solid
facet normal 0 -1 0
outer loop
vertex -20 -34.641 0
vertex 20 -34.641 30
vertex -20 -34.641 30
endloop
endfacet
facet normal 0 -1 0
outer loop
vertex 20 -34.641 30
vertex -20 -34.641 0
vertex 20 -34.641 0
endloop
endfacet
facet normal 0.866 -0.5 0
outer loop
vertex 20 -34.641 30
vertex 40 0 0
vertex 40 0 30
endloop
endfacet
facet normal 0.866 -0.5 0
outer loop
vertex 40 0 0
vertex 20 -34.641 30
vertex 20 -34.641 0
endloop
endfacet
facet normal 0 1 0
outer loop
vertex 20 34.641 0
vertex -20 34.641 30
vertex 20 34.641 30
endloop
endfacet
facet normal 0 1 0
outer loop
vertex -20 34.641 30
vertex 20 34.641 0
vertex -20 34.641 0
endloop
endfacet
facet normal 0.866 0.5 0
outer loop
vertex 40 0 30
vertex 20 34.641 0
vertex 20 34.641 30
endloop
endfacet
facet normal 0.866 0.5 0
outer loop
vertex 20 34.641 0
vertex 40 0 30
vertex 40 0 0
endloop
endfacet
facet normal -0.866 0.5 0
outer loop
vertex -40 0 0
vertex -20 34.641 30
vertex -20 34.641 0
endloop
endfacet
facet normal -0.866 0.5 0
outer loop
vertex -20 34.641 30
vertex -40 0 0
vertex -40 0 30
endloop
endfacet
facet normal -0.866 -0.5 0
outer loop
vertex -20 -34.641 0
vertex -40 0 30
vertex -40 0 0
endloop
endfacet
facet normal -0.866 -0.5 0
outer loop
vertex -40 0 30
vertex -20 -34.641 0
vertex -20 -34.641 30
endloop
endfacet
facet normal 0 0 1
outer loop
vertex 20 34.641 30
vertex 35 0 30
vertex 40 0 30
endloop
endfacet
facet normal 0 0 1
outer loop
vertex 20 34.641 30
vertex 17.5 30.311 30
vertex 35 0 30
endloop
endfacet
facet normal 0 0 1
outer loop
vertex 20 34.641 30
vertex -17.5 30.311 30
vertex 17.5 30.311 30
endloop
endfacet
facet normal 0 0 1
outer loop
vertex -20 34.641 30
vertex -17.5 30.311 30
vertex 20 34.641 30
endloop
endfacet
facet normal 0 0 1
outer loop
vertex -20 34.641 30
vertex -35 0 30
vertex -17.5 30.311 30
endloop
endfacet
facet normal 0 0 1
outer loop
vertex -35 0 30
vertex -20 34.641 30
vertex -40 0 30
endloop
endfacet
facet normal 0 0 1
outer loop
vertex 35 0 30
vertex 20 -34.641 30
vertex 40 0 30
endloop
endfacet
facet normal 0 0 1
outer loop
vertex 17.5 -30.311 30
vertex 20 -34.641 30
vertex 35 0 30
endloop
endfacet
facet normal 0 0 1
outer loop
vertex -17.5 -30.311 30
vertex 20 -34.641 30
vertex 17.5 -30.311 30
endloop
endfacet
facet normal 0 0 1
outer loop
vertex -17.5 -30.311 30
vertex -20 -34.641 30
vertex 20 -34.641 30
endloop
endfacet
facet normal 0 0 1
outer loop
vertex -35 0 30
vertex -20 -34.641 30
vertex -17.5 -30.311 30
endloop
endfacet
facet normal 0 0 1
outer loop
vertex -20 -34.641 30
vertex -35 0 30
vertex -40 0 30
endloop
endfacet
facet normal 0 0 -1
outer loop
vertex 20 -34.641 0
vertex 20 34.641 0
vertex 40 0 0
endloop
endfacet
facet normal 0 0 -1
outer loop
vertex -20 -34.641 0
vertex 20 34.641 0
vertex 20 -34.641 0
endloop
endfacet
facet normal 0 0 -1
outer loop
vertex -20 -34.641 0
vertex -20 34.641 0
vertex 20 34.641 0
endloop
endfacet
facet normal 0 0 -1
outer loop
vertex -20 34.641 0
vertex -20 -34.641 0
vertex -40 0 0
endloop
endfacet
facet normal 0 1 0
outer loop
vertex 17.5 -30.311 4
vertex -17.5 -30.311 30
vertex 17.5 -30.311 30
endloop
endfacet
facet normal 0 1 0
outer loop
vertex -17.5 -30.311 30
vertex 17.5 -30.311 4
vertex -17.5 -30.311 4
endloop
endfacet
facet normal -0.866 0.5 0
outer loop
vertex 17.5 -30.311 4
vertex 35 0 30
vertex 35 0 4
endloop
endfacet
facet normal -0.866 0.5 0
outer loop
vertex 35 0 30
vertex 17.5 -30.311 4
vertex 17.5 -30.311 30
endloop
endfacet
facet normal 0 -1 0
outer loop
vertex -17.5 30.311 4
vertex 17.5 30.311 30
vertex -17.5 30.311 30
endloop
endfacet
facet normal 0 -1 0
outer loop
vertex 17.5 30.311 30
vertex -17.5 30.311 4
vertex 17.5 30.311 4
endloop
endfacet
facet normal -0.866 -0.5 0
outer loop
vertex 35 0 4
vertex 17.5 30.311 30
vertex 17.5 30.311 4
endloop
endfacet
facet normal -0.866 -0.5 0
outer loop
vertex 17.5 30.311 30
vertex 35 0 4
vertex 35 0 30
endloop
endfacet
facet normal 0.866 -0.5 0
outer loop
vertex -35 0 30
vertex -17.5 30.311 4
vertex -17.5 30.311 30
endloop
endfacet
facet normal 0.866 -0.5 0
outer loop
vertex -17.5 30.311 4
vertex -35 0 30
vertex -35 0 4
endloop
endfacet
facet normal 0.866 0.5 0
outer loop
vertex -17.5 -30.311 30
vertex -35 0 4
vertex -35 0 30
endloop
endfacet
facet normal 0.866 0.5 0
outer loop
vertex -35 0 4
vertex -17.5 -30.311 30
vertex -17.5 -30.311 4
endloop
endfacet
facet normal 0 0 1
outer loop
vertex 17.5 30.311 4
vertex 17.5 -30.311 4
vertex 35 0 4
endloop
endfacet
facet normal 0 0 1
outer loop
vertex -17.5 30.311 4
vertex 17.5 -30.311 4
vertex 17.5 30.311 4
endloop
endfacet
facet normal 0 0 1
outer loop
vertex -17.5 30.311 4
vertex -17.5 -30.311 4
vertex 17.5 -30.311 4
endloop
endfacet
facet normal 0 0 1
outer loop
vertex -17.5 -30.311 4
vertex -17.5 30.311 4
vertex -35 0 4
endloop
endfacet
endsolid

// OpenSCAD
difference() {
cylinder(r=40, h=30, $fn=6);
translate([0,0,4]) cylinder(r=35, h=28, $fn=6);
}
